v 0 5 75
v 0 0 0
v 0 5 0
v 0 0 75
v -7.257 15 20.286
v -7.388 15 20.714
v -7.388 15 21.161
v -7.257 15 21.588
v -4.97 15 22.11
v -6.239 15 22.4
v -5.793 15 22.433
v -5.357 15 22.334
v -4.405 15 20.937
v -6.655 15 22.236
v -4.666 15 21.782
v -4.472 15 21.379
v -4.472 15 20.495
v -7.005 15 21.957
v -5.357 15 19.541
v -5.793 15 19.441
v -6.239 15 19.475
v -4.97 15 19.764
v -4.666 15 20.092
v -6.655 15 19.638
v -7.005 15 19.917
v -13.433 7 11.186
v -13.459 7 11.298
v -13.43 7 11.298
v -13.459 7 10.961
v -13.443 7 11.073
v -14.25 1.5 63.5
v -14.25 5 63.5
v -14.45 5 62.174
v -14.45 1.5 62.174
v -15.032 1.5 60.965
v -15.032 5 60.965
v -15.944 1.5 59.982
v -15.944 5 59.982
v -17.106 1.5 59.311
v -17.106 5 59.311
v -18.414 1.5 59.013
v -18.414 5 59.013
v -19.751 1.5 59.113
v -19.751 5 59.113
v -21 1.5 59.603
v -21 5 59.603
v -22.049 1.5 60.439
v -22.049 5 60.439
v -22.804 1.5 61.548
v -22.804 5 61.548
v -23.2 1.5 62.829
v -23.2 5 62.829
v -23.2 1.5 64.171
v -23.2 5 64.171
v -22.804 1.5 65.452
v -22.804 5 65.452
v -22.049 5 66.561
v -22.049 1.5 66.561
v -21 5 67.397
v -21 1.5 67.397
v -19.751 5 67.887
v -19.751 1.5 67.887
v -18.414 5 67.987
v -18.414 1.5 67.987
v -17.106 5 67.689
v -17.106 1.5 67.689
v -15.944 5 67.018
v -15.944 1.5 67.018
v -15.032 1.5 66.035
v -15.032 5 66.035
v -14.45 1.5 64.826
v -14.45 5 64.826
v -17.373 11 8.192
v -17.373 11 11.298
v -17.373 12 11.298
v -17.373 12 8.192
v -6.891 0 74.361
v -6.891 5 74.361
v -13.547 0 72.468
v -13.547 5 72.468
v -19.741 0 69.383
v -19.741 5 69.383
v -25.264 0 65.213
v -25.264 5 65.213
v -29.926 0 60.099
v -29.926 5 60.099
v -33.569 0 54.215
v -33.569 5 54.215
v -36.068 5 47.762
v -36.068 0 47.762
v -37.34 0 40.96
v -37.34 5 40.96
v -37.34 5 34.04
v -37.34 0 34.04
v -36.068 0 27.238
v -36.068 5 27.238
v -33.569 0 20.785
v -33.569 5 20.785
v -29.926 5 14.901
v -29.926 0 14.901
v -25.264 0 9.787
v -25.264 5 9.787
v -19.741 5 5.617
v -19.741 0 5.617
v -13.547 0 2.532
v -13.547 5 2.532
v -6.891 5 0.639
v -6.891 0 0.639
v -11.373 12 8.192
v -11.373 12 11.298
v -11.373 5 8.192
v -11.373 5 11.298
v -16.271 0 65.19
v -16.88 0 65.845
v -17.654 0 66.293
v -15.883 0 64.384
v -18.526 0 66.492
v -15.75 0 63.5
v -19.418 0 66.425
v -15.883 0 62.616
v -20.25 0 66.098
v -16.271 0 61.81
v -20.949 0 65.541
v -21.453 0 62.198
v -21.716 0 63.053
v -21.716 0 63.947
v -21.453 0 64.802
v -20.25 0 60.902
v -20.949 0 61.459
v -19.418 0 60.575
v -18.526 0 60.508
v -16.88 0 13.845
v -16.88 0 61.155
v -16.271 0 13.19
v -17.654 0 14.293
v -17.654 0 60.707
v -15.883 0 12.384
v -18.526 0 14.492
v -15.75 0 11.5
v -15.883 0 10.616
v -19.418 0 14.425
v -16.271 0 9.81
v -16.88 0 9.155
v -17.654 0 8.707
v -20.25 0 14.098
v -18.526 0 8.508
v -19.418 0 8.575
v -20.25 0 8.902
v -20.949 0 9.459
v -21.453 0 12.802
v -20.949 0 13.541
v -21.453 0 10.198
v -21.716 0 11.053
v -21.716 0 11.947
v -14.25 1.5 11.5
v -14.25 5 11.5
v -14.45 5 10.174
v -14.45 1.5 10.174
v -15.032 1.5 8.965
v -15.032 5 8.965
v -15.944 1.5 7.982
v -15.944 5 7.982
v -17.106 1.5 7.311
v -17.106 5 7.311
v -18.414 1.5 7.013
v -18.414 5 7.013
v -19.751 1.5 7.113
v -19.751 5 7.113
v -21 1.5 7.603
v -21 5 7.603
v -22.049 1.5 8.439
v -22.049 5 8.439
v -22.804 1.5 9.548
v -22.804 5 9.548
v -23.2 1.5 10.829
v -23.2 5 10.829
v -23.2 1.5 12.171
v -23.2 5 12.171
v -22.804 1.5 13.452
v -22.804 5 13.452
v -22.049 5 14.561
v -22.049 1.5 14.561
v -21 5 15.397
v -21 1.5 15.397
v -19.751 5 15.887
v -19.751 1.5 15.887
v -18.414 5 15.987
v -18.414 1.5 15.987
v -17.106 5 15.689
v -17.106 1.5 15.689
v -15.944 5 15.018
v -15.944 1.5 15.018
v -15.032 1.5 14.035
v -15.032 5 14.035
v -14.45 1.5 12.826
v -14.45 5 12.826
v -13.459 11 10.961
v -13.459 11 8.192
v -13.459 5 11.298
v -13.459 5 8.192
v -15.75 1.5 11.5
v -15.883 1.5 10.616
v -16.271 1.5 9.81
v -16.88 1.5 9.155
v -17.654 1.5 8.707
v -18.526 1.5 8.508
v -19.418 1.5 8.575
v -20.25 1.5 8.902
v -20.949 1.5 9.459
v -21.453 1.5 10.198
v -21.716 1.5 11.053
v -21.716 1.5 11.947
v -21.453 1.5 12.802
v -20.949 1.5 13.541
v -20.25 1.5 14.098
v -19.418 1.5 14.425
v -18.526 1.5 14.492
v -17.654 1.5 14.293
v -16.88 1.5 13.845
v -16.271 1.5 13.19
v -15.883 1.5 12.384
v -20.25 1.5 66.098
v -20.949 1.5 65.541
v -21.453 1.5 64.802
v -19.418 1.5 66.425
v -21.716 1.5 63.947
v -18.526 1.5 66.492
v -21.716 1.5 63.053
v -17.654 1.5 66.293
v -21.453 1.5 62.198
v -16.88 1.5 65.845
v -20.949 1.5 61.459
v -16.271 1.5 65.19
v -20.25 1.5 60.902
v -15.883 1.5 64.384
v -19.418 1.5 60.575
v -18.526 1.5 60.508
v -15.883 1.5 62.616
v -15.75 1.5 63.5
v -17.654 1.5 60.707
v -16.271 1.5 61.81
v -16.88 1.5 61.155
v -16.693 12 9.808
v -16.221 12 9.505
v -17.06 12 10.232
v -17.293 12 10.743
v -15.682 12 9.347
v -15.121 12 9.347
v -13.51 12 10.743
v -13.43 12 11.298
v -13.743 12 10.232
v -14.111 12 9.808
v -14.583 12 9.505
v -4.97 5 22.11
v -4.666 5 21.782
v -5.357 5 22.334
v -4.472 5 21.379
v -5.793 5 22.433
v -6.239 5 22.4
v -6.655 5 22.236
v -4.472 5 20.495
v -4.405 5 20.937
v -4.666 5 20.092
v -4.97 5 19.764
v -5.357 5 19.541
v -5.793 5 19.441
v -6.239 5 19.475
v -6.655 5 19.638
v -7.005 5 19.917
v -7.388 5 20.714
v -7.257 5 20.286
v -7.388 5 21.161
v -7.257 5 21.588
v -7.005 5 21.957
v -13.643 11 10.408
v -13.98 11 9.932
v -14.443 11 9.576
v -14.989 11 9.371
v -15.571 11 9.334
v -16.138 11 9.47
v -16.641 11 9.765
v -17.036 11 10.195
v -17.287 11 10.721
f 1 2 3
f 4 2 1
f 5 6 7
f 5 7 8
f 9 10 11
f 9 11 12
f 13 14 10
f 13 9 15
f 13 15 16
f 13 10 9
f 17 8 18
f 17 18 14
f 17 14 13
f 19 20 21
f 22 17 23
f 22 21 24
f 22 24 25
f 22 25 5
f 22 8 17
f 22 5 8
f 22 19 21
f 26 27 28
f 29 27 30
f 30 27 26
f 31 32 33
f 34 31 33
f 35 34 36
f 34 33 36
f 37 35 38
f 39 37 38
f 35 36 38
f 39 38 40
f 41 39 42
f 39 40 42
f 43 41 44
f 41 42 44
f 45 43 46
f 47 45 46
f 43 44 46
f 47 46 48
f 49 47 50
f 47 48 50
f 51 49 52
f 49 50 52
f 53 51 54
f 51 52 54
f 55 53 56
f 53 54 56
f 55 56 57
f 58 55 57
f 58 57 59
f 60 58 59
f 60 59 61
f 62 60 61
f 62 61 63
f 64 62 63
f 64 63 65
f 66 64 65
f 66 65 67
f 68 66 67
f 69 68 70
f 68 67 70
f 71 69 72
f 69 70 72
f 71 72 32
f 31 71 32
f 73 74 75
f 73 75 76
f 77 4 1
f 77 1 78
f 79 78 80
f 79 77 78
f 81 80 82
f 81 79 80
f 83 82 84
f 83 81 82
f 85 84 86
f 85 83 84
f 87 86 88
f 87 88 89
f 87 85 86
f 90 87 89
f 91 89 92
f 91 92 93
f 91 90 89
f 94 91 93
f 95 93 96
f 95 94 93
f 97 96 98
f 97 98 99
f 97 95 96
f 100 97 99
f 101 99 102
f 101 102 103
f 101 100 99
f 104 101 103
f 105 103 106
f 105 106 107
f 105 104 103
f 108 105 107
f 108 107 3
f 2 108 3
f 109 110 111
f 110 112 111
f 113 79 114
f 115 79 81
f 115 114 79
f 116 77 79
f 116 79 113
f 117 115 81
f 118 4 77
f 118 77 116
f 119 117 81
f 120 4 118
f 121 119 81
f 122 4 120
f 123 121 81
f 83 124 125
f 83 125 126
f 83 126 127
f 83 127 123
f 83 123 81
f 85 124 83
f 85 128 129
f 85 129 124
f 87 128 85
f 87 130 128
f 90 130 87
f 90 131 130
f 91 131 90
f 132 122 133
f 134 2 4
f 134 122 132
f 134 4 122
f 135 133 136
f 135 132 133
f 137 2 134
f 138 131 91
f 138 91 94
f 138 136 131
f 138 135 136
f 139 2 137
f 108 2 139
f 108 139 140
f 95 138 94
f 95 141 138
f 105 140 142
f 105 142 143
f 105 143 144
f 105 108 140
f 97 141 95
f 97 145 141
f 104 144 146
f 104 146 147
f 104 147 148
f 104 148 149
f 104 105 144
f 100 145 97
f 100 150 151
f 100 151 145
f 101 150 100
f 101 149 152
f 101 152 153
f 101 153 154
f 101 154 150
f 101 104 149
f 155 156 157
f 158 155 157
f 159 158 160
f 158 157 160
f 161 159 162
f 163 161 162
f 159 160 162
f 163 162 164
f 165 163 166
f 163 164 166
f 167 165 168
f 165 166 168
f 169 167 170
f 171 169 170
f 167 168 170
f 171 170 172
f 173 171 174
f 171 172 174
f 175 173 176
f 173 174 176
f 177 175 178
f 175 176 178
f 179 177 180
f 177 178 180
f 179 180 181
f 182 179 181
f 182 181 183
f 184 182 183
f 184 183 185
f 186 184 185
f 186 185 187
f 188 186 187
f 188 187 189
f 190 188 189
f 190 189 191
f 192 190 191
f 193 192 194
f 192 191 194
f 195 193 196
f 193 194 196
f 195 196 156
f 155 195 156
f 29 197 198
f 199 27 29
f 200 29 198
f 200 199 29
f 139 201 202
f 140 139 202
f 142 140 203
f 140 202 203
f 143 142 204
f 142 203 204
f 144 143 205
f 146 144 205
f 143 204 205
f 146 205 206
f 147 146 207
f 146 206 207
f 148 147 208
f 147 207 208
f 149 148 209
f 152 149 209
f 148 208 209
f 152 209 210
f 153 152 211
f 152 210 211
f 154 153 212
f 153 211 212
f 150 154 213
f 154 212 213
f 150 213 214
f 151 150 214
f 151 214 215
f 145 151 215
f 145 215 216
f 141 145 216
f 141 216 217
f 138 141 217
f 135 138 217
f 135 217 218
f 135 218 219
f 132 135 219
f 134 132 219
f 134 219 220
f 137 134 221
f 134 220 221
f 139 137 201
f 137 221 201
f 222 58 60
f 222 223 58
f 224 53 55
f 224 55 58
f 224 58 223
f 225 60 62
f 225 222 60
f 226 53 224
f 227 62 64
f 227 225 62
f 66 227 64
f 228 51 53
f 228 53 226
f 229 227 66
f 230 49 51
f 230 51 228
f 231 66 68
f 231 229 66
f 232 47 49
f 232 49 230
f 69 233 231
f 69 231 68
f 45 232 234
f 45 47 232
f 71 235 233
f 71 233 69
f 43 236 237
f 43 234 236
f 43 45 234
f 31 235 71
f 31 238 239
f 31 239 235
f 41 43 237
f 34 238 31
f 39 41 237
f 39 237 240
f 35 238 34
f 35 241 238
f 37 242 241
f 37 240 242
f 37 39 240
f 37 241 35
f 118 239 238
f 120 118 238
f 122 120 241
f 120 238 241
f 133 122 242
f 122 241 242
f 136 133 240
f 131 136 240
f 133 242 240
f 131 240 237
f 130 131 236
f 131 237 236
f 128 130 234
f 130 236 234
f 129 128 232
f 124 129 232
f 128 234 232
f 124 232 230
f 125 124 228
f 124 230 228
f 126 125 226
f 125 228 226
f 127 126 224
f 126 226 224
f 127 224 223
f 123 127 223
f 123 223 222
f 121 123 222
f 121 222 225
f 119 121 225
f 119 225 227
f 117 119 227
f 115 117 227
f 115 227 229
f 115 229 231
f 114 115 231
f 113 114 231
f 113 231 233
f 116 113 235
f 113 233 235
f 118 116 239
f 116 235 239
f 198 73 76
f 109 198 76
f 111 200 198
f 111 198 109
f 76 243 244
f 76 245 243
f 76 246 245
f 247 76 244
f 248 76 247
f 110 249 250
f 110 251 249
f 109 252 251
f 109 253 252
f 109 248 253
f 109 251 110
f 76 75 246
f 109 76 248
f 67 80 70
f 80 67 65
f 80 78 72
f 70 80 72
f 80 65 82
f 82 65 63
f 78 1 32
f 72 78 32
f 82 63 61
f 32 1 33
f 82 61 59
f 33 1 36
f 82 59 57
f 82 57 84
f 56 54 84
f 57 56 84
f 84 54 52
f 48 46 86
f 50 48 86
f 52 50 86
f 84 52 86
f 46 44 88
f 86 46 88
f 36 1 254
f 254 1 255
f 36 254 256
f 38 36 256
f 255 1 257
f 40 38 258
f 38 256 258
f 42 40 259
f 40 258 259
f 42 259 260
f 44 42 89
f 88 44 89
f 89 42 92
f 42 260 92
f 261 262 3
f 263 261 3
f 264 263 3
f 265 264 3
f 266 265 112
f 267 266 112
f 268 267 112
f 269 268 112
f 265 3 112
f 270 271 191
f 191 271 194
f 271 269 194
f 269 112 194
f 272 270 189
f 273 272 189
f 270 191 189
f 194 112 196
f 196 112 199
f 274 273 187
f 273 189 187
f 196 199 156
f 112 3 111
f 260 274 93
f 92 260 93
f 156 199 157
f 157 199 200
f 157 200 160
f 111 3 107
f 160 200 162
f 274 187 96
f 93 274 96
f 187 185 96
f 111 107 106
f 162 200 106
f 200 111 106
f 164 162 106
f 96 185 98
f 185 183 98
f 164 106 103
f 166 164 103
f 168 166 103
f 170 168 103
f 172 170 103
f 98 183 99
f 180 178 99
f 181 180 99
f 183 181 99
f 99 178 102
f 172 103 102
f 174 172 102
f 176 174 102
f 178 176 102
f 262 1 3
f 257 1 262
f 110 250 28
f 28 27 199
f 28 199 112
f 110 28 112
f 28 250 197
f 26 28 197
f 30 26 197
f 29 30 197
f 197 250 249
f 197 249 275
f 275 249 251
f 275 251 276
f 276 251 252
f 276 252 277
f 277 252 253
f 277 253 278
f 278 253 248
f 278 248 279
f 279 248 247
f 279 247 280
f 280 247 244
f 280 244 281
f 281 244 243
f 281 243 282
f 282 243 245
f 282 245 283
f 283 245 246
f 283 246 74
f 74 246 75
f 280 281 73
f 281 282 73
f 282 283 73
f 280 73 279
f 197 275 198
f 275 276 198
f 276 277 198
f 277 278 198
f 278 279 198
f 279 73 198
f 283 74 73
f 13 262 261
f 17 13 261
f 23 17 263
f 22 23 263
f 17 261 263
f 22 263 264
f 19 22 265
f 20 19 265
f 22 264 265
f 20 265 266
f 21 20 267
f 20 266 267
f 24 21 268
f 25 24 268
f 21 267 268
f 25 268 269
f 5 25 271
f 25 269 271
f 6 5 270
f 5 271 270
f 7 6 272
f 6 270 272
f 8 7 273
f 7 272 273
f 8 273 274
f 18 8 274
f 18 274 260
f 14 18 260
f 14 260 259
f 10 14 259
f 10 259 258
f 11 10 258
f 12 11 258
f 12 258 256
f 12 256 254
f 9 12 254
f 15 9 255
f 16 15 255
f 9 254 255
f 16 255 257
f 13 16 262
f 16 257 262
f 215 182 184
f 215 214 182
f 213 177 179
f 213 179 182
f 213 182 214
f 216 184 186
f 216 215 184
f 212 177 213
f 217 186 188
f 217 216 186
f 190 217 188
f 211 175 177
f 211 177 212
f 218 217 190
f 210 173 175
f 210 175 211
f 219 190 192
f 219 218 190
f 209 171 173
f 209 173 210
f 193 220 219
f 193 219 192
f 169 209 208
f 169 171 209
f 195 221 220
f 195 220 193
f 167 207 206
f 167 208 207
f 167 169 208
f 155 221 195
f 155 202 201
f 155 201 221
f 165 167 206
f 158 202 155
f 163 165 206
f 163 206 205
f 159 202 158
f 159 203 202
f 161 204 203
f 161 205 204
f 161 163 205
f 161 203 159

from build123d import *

# Parameters (mm, degrees)
AUFSATZ_LINEAR_AUSTRAGEN1_DEPTH = 5
SKIZZE11_R                      = 4.5
SCHNITT_LINEAR_AUSTRAGEN1_DEPTH = 3.5
SKIZZE12_R                      = 3
SCHNITT_LINEAR_AUSTRAGEN2_DEPTH = 1.5
SKIZZE13_W                      = 2.085762608
SKIZZE13_H                      = 3.10677117
AUFSATZ_LINEAR_AUSTRAGEN2_DEPTH = 6
SKIZZE14_W                      = 6
SKIZZE14_H                      = 3.10677117
AUFSATZ_LINEAR_AUSTRAGEN3_DEPTH = 1
SCHNITT_LINEAR_AUSTRAGEN3_DEPTH = 5
SKIZZE17_R                      = 1.5
AUFSATZ_LINEAR_AUSTRAGEN4_DEPTH = 10


with BuildPart() as part:
    # Skizze1 → Aufsatz-Linear austragen1 (new body)
    with BuildSketch(Plane(origin=(0, 0, 0), x_dir=(1, 0, 0), z_dir=(0, 1, 0))):
        with BuildLine():
            Line((0, 0), (0, -75))
            ThreePointArc((0, -75), (-37.5, -37.5), (0, 0))
        make_face()
    extrude(amount=AUFSATZ_LINEAR_AUSTRAGEN1_DEPTH)

    # Skizze11 → Schnitt-Linear austragen1 (cut)
    with BuildSketch(Plane(origin=(0, 5, 0), x_dir=(1, 0, 0), z_dir=(0, 1, 0))):
        with Locations((-18.75, -11.5)):
            Circle(SKIZZE11_R)
        with Locations((-18.75, -63.5)):
            Circle(SKIZZE11_R)
    extrude(amount=-SCHNITT_LINEAR_AUSTRAGEN1_DEPTH, mode=Mode.SUBTRACT)

    # Skizze12 → Schnitt-Linear austragen2 (cut)
    with BuildSketch(Plane(origin=(0, 1.5, 0), x_dir=(1, 0, 0), z_dir=(0, 1, 0))):
        with Locations((-18.75, -63.5)):
            Circle(SKIZZE12_R)
        with Locations((-18.75, -11.5)):
            Circle(SKIZZE12_R)
    extrude(amount=-SCHNITT_LINEAR_AUSTRAGEN2_DEPTH, mode=Mode.SUBTRACT)

    # Skizze13 → Aufsatz-Linear austragen2 (add)
    with BuildSketch(Plane(origin=(0, 5, 0), x_dir=(1, 0, 0), z_dir=(0, 1, 0))):
        with Locations((-12.416205268, -9.745021236)):
            Rectangle(SKIZZE13_W, SKIZZE13_H)
    extrude(amount=AUFSATZ_LINEAR_AUSTRAGEN2_DEPTH)

    # Skizze14 → Aufsatz-Linear austragen3 (add)
    with BuildSketch(Plane(origin=(0, 11, 0), x_dir=(1, 0, 0), z_dir=(0, 1, 0))):
        with Locations((-14.373323964, -9.745021236)):
            Rectangle(SKIZZE14_W, SKIZZE14_H)
    extrude(amount=AUFSATZ_LINEAR_AUSTRAGEN3_DEPTH)

    # Skizze16 → Schnitt-Linear austragen3 (cut)
    with BuildSketch(Plane(origin=(0, 12, 0), x_dir=(1, 0, 0), z_dir=(0, 1, 0))):
        with BuildLine():
            Line((-17.373323964, -11.298406821), (-13.43004884, -11.298406821))
            ThreePointArc((-13.43004884, -11.298406821), (-15.401686402, -9.326769259), (-17.373323964, -11.298406821))
        make_face()
    extrude(amount=-SCHNITT_LINEAR_AUSTRAGEN3_DEPTH, mode=Mode.SUBTRACT)

    # Skizze17 → Aufsatz-Linear austragen4 (add)
    with BuildSketch(Plane(origin=(0, 5, 0), x_dir=(1, 0, 0), z_dir=(0, 1, 0))):
        with Locations((-5.905120945, -20.937212942)):
            Circle(SKIZZE17_R)
    extrude(amount=AUFSATZ_LINEAR_AUSTRAGEN4_DEPTH)


solid = part.part
